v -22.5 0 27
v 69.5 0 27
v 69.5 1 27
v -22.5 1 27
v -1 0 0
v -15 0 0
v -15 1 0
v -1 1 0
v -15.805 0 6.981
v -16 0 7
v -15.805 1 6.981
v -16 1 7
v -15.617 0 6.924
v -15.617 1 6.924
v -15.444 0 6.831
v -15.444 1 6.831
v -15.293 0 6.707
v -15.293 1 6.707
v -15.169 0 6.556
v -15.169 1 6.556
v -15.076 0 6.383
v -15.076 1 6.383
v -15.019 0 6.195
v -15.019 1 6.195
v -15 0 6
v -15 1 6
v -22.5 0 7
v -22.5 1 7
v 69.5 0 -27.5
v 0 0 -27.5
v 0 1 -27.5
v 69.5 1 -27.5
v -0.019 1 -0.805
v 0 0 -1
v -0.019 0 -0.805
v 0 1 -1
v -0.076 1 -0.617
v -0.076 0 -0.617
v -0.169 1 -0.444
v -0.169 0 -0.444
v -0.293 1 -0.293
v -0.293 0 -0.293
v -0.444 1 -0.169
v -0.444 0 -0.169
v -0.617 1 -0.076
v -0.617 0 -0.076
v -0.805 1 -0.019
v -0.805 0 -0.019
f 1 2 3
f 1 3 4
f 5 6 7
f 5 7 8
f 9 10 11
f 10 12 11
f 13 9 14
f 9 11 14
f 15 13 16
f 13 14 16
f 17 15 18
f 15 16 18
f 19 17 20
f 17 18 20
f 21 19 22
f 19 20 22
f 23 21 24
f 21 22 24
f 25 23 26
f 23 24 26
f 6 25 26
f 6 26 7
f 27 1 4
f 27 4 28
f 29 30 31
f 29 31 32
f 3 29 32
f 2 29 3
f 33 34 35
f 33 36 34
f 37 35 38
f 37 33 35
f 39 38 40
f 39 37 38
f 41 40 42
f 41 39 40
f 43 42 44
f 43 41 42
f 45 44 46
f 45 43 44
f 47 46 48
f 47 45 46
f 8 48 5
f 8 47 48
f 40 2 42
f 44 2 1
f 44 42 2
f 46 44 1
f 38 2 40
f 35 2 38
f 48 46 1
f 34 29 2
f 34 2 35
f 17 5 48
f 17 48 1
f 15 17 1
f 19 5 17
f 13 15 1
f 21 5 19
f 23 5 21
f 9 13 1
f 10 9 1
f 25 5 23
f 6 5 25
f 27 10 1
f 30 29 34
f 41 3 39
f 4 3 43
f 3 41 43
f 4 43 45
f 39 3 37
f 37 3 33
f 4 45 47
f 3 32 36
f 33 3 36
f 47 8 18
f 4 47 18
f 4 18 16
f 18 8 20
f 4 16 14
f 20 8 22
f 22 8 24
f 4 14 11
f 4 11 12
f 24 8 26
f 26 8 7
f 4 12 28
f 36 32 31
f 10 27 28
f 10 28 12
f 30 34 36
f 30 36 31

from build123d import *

# Parameters (mm, degrees)
BOSS_EXTRUDE1_DEPTH = 1
FILLET1_R           = 1


with BuildPart() as part:
    # Sketch1 → Boss-Extrude1 (new body)
    with BuildSketch(Plane(origin=(0, 0, 0), x_dir=(1, 0, 0), z_dir=(0, 1, 0))):
        Polygon((0, 0), (0, 27.5), (69.5, 27.5), (69.5, -27), (-22.5, -27), (-22.5, -7), (-15, -7), (-15, 0), align=None)
    extrude(amount=BOSS_EXTRUDE1_DEPTH)

    # Fillet1
    fillet1_edges = [part.edges().sort_by_distance(p)[0] for p in [
        (0, 0.5, 0),
        (-15, 0.5, 7),
    ]]
    fillet(fillet1_edges, radius=FILLET1_R)


solid = part.part
